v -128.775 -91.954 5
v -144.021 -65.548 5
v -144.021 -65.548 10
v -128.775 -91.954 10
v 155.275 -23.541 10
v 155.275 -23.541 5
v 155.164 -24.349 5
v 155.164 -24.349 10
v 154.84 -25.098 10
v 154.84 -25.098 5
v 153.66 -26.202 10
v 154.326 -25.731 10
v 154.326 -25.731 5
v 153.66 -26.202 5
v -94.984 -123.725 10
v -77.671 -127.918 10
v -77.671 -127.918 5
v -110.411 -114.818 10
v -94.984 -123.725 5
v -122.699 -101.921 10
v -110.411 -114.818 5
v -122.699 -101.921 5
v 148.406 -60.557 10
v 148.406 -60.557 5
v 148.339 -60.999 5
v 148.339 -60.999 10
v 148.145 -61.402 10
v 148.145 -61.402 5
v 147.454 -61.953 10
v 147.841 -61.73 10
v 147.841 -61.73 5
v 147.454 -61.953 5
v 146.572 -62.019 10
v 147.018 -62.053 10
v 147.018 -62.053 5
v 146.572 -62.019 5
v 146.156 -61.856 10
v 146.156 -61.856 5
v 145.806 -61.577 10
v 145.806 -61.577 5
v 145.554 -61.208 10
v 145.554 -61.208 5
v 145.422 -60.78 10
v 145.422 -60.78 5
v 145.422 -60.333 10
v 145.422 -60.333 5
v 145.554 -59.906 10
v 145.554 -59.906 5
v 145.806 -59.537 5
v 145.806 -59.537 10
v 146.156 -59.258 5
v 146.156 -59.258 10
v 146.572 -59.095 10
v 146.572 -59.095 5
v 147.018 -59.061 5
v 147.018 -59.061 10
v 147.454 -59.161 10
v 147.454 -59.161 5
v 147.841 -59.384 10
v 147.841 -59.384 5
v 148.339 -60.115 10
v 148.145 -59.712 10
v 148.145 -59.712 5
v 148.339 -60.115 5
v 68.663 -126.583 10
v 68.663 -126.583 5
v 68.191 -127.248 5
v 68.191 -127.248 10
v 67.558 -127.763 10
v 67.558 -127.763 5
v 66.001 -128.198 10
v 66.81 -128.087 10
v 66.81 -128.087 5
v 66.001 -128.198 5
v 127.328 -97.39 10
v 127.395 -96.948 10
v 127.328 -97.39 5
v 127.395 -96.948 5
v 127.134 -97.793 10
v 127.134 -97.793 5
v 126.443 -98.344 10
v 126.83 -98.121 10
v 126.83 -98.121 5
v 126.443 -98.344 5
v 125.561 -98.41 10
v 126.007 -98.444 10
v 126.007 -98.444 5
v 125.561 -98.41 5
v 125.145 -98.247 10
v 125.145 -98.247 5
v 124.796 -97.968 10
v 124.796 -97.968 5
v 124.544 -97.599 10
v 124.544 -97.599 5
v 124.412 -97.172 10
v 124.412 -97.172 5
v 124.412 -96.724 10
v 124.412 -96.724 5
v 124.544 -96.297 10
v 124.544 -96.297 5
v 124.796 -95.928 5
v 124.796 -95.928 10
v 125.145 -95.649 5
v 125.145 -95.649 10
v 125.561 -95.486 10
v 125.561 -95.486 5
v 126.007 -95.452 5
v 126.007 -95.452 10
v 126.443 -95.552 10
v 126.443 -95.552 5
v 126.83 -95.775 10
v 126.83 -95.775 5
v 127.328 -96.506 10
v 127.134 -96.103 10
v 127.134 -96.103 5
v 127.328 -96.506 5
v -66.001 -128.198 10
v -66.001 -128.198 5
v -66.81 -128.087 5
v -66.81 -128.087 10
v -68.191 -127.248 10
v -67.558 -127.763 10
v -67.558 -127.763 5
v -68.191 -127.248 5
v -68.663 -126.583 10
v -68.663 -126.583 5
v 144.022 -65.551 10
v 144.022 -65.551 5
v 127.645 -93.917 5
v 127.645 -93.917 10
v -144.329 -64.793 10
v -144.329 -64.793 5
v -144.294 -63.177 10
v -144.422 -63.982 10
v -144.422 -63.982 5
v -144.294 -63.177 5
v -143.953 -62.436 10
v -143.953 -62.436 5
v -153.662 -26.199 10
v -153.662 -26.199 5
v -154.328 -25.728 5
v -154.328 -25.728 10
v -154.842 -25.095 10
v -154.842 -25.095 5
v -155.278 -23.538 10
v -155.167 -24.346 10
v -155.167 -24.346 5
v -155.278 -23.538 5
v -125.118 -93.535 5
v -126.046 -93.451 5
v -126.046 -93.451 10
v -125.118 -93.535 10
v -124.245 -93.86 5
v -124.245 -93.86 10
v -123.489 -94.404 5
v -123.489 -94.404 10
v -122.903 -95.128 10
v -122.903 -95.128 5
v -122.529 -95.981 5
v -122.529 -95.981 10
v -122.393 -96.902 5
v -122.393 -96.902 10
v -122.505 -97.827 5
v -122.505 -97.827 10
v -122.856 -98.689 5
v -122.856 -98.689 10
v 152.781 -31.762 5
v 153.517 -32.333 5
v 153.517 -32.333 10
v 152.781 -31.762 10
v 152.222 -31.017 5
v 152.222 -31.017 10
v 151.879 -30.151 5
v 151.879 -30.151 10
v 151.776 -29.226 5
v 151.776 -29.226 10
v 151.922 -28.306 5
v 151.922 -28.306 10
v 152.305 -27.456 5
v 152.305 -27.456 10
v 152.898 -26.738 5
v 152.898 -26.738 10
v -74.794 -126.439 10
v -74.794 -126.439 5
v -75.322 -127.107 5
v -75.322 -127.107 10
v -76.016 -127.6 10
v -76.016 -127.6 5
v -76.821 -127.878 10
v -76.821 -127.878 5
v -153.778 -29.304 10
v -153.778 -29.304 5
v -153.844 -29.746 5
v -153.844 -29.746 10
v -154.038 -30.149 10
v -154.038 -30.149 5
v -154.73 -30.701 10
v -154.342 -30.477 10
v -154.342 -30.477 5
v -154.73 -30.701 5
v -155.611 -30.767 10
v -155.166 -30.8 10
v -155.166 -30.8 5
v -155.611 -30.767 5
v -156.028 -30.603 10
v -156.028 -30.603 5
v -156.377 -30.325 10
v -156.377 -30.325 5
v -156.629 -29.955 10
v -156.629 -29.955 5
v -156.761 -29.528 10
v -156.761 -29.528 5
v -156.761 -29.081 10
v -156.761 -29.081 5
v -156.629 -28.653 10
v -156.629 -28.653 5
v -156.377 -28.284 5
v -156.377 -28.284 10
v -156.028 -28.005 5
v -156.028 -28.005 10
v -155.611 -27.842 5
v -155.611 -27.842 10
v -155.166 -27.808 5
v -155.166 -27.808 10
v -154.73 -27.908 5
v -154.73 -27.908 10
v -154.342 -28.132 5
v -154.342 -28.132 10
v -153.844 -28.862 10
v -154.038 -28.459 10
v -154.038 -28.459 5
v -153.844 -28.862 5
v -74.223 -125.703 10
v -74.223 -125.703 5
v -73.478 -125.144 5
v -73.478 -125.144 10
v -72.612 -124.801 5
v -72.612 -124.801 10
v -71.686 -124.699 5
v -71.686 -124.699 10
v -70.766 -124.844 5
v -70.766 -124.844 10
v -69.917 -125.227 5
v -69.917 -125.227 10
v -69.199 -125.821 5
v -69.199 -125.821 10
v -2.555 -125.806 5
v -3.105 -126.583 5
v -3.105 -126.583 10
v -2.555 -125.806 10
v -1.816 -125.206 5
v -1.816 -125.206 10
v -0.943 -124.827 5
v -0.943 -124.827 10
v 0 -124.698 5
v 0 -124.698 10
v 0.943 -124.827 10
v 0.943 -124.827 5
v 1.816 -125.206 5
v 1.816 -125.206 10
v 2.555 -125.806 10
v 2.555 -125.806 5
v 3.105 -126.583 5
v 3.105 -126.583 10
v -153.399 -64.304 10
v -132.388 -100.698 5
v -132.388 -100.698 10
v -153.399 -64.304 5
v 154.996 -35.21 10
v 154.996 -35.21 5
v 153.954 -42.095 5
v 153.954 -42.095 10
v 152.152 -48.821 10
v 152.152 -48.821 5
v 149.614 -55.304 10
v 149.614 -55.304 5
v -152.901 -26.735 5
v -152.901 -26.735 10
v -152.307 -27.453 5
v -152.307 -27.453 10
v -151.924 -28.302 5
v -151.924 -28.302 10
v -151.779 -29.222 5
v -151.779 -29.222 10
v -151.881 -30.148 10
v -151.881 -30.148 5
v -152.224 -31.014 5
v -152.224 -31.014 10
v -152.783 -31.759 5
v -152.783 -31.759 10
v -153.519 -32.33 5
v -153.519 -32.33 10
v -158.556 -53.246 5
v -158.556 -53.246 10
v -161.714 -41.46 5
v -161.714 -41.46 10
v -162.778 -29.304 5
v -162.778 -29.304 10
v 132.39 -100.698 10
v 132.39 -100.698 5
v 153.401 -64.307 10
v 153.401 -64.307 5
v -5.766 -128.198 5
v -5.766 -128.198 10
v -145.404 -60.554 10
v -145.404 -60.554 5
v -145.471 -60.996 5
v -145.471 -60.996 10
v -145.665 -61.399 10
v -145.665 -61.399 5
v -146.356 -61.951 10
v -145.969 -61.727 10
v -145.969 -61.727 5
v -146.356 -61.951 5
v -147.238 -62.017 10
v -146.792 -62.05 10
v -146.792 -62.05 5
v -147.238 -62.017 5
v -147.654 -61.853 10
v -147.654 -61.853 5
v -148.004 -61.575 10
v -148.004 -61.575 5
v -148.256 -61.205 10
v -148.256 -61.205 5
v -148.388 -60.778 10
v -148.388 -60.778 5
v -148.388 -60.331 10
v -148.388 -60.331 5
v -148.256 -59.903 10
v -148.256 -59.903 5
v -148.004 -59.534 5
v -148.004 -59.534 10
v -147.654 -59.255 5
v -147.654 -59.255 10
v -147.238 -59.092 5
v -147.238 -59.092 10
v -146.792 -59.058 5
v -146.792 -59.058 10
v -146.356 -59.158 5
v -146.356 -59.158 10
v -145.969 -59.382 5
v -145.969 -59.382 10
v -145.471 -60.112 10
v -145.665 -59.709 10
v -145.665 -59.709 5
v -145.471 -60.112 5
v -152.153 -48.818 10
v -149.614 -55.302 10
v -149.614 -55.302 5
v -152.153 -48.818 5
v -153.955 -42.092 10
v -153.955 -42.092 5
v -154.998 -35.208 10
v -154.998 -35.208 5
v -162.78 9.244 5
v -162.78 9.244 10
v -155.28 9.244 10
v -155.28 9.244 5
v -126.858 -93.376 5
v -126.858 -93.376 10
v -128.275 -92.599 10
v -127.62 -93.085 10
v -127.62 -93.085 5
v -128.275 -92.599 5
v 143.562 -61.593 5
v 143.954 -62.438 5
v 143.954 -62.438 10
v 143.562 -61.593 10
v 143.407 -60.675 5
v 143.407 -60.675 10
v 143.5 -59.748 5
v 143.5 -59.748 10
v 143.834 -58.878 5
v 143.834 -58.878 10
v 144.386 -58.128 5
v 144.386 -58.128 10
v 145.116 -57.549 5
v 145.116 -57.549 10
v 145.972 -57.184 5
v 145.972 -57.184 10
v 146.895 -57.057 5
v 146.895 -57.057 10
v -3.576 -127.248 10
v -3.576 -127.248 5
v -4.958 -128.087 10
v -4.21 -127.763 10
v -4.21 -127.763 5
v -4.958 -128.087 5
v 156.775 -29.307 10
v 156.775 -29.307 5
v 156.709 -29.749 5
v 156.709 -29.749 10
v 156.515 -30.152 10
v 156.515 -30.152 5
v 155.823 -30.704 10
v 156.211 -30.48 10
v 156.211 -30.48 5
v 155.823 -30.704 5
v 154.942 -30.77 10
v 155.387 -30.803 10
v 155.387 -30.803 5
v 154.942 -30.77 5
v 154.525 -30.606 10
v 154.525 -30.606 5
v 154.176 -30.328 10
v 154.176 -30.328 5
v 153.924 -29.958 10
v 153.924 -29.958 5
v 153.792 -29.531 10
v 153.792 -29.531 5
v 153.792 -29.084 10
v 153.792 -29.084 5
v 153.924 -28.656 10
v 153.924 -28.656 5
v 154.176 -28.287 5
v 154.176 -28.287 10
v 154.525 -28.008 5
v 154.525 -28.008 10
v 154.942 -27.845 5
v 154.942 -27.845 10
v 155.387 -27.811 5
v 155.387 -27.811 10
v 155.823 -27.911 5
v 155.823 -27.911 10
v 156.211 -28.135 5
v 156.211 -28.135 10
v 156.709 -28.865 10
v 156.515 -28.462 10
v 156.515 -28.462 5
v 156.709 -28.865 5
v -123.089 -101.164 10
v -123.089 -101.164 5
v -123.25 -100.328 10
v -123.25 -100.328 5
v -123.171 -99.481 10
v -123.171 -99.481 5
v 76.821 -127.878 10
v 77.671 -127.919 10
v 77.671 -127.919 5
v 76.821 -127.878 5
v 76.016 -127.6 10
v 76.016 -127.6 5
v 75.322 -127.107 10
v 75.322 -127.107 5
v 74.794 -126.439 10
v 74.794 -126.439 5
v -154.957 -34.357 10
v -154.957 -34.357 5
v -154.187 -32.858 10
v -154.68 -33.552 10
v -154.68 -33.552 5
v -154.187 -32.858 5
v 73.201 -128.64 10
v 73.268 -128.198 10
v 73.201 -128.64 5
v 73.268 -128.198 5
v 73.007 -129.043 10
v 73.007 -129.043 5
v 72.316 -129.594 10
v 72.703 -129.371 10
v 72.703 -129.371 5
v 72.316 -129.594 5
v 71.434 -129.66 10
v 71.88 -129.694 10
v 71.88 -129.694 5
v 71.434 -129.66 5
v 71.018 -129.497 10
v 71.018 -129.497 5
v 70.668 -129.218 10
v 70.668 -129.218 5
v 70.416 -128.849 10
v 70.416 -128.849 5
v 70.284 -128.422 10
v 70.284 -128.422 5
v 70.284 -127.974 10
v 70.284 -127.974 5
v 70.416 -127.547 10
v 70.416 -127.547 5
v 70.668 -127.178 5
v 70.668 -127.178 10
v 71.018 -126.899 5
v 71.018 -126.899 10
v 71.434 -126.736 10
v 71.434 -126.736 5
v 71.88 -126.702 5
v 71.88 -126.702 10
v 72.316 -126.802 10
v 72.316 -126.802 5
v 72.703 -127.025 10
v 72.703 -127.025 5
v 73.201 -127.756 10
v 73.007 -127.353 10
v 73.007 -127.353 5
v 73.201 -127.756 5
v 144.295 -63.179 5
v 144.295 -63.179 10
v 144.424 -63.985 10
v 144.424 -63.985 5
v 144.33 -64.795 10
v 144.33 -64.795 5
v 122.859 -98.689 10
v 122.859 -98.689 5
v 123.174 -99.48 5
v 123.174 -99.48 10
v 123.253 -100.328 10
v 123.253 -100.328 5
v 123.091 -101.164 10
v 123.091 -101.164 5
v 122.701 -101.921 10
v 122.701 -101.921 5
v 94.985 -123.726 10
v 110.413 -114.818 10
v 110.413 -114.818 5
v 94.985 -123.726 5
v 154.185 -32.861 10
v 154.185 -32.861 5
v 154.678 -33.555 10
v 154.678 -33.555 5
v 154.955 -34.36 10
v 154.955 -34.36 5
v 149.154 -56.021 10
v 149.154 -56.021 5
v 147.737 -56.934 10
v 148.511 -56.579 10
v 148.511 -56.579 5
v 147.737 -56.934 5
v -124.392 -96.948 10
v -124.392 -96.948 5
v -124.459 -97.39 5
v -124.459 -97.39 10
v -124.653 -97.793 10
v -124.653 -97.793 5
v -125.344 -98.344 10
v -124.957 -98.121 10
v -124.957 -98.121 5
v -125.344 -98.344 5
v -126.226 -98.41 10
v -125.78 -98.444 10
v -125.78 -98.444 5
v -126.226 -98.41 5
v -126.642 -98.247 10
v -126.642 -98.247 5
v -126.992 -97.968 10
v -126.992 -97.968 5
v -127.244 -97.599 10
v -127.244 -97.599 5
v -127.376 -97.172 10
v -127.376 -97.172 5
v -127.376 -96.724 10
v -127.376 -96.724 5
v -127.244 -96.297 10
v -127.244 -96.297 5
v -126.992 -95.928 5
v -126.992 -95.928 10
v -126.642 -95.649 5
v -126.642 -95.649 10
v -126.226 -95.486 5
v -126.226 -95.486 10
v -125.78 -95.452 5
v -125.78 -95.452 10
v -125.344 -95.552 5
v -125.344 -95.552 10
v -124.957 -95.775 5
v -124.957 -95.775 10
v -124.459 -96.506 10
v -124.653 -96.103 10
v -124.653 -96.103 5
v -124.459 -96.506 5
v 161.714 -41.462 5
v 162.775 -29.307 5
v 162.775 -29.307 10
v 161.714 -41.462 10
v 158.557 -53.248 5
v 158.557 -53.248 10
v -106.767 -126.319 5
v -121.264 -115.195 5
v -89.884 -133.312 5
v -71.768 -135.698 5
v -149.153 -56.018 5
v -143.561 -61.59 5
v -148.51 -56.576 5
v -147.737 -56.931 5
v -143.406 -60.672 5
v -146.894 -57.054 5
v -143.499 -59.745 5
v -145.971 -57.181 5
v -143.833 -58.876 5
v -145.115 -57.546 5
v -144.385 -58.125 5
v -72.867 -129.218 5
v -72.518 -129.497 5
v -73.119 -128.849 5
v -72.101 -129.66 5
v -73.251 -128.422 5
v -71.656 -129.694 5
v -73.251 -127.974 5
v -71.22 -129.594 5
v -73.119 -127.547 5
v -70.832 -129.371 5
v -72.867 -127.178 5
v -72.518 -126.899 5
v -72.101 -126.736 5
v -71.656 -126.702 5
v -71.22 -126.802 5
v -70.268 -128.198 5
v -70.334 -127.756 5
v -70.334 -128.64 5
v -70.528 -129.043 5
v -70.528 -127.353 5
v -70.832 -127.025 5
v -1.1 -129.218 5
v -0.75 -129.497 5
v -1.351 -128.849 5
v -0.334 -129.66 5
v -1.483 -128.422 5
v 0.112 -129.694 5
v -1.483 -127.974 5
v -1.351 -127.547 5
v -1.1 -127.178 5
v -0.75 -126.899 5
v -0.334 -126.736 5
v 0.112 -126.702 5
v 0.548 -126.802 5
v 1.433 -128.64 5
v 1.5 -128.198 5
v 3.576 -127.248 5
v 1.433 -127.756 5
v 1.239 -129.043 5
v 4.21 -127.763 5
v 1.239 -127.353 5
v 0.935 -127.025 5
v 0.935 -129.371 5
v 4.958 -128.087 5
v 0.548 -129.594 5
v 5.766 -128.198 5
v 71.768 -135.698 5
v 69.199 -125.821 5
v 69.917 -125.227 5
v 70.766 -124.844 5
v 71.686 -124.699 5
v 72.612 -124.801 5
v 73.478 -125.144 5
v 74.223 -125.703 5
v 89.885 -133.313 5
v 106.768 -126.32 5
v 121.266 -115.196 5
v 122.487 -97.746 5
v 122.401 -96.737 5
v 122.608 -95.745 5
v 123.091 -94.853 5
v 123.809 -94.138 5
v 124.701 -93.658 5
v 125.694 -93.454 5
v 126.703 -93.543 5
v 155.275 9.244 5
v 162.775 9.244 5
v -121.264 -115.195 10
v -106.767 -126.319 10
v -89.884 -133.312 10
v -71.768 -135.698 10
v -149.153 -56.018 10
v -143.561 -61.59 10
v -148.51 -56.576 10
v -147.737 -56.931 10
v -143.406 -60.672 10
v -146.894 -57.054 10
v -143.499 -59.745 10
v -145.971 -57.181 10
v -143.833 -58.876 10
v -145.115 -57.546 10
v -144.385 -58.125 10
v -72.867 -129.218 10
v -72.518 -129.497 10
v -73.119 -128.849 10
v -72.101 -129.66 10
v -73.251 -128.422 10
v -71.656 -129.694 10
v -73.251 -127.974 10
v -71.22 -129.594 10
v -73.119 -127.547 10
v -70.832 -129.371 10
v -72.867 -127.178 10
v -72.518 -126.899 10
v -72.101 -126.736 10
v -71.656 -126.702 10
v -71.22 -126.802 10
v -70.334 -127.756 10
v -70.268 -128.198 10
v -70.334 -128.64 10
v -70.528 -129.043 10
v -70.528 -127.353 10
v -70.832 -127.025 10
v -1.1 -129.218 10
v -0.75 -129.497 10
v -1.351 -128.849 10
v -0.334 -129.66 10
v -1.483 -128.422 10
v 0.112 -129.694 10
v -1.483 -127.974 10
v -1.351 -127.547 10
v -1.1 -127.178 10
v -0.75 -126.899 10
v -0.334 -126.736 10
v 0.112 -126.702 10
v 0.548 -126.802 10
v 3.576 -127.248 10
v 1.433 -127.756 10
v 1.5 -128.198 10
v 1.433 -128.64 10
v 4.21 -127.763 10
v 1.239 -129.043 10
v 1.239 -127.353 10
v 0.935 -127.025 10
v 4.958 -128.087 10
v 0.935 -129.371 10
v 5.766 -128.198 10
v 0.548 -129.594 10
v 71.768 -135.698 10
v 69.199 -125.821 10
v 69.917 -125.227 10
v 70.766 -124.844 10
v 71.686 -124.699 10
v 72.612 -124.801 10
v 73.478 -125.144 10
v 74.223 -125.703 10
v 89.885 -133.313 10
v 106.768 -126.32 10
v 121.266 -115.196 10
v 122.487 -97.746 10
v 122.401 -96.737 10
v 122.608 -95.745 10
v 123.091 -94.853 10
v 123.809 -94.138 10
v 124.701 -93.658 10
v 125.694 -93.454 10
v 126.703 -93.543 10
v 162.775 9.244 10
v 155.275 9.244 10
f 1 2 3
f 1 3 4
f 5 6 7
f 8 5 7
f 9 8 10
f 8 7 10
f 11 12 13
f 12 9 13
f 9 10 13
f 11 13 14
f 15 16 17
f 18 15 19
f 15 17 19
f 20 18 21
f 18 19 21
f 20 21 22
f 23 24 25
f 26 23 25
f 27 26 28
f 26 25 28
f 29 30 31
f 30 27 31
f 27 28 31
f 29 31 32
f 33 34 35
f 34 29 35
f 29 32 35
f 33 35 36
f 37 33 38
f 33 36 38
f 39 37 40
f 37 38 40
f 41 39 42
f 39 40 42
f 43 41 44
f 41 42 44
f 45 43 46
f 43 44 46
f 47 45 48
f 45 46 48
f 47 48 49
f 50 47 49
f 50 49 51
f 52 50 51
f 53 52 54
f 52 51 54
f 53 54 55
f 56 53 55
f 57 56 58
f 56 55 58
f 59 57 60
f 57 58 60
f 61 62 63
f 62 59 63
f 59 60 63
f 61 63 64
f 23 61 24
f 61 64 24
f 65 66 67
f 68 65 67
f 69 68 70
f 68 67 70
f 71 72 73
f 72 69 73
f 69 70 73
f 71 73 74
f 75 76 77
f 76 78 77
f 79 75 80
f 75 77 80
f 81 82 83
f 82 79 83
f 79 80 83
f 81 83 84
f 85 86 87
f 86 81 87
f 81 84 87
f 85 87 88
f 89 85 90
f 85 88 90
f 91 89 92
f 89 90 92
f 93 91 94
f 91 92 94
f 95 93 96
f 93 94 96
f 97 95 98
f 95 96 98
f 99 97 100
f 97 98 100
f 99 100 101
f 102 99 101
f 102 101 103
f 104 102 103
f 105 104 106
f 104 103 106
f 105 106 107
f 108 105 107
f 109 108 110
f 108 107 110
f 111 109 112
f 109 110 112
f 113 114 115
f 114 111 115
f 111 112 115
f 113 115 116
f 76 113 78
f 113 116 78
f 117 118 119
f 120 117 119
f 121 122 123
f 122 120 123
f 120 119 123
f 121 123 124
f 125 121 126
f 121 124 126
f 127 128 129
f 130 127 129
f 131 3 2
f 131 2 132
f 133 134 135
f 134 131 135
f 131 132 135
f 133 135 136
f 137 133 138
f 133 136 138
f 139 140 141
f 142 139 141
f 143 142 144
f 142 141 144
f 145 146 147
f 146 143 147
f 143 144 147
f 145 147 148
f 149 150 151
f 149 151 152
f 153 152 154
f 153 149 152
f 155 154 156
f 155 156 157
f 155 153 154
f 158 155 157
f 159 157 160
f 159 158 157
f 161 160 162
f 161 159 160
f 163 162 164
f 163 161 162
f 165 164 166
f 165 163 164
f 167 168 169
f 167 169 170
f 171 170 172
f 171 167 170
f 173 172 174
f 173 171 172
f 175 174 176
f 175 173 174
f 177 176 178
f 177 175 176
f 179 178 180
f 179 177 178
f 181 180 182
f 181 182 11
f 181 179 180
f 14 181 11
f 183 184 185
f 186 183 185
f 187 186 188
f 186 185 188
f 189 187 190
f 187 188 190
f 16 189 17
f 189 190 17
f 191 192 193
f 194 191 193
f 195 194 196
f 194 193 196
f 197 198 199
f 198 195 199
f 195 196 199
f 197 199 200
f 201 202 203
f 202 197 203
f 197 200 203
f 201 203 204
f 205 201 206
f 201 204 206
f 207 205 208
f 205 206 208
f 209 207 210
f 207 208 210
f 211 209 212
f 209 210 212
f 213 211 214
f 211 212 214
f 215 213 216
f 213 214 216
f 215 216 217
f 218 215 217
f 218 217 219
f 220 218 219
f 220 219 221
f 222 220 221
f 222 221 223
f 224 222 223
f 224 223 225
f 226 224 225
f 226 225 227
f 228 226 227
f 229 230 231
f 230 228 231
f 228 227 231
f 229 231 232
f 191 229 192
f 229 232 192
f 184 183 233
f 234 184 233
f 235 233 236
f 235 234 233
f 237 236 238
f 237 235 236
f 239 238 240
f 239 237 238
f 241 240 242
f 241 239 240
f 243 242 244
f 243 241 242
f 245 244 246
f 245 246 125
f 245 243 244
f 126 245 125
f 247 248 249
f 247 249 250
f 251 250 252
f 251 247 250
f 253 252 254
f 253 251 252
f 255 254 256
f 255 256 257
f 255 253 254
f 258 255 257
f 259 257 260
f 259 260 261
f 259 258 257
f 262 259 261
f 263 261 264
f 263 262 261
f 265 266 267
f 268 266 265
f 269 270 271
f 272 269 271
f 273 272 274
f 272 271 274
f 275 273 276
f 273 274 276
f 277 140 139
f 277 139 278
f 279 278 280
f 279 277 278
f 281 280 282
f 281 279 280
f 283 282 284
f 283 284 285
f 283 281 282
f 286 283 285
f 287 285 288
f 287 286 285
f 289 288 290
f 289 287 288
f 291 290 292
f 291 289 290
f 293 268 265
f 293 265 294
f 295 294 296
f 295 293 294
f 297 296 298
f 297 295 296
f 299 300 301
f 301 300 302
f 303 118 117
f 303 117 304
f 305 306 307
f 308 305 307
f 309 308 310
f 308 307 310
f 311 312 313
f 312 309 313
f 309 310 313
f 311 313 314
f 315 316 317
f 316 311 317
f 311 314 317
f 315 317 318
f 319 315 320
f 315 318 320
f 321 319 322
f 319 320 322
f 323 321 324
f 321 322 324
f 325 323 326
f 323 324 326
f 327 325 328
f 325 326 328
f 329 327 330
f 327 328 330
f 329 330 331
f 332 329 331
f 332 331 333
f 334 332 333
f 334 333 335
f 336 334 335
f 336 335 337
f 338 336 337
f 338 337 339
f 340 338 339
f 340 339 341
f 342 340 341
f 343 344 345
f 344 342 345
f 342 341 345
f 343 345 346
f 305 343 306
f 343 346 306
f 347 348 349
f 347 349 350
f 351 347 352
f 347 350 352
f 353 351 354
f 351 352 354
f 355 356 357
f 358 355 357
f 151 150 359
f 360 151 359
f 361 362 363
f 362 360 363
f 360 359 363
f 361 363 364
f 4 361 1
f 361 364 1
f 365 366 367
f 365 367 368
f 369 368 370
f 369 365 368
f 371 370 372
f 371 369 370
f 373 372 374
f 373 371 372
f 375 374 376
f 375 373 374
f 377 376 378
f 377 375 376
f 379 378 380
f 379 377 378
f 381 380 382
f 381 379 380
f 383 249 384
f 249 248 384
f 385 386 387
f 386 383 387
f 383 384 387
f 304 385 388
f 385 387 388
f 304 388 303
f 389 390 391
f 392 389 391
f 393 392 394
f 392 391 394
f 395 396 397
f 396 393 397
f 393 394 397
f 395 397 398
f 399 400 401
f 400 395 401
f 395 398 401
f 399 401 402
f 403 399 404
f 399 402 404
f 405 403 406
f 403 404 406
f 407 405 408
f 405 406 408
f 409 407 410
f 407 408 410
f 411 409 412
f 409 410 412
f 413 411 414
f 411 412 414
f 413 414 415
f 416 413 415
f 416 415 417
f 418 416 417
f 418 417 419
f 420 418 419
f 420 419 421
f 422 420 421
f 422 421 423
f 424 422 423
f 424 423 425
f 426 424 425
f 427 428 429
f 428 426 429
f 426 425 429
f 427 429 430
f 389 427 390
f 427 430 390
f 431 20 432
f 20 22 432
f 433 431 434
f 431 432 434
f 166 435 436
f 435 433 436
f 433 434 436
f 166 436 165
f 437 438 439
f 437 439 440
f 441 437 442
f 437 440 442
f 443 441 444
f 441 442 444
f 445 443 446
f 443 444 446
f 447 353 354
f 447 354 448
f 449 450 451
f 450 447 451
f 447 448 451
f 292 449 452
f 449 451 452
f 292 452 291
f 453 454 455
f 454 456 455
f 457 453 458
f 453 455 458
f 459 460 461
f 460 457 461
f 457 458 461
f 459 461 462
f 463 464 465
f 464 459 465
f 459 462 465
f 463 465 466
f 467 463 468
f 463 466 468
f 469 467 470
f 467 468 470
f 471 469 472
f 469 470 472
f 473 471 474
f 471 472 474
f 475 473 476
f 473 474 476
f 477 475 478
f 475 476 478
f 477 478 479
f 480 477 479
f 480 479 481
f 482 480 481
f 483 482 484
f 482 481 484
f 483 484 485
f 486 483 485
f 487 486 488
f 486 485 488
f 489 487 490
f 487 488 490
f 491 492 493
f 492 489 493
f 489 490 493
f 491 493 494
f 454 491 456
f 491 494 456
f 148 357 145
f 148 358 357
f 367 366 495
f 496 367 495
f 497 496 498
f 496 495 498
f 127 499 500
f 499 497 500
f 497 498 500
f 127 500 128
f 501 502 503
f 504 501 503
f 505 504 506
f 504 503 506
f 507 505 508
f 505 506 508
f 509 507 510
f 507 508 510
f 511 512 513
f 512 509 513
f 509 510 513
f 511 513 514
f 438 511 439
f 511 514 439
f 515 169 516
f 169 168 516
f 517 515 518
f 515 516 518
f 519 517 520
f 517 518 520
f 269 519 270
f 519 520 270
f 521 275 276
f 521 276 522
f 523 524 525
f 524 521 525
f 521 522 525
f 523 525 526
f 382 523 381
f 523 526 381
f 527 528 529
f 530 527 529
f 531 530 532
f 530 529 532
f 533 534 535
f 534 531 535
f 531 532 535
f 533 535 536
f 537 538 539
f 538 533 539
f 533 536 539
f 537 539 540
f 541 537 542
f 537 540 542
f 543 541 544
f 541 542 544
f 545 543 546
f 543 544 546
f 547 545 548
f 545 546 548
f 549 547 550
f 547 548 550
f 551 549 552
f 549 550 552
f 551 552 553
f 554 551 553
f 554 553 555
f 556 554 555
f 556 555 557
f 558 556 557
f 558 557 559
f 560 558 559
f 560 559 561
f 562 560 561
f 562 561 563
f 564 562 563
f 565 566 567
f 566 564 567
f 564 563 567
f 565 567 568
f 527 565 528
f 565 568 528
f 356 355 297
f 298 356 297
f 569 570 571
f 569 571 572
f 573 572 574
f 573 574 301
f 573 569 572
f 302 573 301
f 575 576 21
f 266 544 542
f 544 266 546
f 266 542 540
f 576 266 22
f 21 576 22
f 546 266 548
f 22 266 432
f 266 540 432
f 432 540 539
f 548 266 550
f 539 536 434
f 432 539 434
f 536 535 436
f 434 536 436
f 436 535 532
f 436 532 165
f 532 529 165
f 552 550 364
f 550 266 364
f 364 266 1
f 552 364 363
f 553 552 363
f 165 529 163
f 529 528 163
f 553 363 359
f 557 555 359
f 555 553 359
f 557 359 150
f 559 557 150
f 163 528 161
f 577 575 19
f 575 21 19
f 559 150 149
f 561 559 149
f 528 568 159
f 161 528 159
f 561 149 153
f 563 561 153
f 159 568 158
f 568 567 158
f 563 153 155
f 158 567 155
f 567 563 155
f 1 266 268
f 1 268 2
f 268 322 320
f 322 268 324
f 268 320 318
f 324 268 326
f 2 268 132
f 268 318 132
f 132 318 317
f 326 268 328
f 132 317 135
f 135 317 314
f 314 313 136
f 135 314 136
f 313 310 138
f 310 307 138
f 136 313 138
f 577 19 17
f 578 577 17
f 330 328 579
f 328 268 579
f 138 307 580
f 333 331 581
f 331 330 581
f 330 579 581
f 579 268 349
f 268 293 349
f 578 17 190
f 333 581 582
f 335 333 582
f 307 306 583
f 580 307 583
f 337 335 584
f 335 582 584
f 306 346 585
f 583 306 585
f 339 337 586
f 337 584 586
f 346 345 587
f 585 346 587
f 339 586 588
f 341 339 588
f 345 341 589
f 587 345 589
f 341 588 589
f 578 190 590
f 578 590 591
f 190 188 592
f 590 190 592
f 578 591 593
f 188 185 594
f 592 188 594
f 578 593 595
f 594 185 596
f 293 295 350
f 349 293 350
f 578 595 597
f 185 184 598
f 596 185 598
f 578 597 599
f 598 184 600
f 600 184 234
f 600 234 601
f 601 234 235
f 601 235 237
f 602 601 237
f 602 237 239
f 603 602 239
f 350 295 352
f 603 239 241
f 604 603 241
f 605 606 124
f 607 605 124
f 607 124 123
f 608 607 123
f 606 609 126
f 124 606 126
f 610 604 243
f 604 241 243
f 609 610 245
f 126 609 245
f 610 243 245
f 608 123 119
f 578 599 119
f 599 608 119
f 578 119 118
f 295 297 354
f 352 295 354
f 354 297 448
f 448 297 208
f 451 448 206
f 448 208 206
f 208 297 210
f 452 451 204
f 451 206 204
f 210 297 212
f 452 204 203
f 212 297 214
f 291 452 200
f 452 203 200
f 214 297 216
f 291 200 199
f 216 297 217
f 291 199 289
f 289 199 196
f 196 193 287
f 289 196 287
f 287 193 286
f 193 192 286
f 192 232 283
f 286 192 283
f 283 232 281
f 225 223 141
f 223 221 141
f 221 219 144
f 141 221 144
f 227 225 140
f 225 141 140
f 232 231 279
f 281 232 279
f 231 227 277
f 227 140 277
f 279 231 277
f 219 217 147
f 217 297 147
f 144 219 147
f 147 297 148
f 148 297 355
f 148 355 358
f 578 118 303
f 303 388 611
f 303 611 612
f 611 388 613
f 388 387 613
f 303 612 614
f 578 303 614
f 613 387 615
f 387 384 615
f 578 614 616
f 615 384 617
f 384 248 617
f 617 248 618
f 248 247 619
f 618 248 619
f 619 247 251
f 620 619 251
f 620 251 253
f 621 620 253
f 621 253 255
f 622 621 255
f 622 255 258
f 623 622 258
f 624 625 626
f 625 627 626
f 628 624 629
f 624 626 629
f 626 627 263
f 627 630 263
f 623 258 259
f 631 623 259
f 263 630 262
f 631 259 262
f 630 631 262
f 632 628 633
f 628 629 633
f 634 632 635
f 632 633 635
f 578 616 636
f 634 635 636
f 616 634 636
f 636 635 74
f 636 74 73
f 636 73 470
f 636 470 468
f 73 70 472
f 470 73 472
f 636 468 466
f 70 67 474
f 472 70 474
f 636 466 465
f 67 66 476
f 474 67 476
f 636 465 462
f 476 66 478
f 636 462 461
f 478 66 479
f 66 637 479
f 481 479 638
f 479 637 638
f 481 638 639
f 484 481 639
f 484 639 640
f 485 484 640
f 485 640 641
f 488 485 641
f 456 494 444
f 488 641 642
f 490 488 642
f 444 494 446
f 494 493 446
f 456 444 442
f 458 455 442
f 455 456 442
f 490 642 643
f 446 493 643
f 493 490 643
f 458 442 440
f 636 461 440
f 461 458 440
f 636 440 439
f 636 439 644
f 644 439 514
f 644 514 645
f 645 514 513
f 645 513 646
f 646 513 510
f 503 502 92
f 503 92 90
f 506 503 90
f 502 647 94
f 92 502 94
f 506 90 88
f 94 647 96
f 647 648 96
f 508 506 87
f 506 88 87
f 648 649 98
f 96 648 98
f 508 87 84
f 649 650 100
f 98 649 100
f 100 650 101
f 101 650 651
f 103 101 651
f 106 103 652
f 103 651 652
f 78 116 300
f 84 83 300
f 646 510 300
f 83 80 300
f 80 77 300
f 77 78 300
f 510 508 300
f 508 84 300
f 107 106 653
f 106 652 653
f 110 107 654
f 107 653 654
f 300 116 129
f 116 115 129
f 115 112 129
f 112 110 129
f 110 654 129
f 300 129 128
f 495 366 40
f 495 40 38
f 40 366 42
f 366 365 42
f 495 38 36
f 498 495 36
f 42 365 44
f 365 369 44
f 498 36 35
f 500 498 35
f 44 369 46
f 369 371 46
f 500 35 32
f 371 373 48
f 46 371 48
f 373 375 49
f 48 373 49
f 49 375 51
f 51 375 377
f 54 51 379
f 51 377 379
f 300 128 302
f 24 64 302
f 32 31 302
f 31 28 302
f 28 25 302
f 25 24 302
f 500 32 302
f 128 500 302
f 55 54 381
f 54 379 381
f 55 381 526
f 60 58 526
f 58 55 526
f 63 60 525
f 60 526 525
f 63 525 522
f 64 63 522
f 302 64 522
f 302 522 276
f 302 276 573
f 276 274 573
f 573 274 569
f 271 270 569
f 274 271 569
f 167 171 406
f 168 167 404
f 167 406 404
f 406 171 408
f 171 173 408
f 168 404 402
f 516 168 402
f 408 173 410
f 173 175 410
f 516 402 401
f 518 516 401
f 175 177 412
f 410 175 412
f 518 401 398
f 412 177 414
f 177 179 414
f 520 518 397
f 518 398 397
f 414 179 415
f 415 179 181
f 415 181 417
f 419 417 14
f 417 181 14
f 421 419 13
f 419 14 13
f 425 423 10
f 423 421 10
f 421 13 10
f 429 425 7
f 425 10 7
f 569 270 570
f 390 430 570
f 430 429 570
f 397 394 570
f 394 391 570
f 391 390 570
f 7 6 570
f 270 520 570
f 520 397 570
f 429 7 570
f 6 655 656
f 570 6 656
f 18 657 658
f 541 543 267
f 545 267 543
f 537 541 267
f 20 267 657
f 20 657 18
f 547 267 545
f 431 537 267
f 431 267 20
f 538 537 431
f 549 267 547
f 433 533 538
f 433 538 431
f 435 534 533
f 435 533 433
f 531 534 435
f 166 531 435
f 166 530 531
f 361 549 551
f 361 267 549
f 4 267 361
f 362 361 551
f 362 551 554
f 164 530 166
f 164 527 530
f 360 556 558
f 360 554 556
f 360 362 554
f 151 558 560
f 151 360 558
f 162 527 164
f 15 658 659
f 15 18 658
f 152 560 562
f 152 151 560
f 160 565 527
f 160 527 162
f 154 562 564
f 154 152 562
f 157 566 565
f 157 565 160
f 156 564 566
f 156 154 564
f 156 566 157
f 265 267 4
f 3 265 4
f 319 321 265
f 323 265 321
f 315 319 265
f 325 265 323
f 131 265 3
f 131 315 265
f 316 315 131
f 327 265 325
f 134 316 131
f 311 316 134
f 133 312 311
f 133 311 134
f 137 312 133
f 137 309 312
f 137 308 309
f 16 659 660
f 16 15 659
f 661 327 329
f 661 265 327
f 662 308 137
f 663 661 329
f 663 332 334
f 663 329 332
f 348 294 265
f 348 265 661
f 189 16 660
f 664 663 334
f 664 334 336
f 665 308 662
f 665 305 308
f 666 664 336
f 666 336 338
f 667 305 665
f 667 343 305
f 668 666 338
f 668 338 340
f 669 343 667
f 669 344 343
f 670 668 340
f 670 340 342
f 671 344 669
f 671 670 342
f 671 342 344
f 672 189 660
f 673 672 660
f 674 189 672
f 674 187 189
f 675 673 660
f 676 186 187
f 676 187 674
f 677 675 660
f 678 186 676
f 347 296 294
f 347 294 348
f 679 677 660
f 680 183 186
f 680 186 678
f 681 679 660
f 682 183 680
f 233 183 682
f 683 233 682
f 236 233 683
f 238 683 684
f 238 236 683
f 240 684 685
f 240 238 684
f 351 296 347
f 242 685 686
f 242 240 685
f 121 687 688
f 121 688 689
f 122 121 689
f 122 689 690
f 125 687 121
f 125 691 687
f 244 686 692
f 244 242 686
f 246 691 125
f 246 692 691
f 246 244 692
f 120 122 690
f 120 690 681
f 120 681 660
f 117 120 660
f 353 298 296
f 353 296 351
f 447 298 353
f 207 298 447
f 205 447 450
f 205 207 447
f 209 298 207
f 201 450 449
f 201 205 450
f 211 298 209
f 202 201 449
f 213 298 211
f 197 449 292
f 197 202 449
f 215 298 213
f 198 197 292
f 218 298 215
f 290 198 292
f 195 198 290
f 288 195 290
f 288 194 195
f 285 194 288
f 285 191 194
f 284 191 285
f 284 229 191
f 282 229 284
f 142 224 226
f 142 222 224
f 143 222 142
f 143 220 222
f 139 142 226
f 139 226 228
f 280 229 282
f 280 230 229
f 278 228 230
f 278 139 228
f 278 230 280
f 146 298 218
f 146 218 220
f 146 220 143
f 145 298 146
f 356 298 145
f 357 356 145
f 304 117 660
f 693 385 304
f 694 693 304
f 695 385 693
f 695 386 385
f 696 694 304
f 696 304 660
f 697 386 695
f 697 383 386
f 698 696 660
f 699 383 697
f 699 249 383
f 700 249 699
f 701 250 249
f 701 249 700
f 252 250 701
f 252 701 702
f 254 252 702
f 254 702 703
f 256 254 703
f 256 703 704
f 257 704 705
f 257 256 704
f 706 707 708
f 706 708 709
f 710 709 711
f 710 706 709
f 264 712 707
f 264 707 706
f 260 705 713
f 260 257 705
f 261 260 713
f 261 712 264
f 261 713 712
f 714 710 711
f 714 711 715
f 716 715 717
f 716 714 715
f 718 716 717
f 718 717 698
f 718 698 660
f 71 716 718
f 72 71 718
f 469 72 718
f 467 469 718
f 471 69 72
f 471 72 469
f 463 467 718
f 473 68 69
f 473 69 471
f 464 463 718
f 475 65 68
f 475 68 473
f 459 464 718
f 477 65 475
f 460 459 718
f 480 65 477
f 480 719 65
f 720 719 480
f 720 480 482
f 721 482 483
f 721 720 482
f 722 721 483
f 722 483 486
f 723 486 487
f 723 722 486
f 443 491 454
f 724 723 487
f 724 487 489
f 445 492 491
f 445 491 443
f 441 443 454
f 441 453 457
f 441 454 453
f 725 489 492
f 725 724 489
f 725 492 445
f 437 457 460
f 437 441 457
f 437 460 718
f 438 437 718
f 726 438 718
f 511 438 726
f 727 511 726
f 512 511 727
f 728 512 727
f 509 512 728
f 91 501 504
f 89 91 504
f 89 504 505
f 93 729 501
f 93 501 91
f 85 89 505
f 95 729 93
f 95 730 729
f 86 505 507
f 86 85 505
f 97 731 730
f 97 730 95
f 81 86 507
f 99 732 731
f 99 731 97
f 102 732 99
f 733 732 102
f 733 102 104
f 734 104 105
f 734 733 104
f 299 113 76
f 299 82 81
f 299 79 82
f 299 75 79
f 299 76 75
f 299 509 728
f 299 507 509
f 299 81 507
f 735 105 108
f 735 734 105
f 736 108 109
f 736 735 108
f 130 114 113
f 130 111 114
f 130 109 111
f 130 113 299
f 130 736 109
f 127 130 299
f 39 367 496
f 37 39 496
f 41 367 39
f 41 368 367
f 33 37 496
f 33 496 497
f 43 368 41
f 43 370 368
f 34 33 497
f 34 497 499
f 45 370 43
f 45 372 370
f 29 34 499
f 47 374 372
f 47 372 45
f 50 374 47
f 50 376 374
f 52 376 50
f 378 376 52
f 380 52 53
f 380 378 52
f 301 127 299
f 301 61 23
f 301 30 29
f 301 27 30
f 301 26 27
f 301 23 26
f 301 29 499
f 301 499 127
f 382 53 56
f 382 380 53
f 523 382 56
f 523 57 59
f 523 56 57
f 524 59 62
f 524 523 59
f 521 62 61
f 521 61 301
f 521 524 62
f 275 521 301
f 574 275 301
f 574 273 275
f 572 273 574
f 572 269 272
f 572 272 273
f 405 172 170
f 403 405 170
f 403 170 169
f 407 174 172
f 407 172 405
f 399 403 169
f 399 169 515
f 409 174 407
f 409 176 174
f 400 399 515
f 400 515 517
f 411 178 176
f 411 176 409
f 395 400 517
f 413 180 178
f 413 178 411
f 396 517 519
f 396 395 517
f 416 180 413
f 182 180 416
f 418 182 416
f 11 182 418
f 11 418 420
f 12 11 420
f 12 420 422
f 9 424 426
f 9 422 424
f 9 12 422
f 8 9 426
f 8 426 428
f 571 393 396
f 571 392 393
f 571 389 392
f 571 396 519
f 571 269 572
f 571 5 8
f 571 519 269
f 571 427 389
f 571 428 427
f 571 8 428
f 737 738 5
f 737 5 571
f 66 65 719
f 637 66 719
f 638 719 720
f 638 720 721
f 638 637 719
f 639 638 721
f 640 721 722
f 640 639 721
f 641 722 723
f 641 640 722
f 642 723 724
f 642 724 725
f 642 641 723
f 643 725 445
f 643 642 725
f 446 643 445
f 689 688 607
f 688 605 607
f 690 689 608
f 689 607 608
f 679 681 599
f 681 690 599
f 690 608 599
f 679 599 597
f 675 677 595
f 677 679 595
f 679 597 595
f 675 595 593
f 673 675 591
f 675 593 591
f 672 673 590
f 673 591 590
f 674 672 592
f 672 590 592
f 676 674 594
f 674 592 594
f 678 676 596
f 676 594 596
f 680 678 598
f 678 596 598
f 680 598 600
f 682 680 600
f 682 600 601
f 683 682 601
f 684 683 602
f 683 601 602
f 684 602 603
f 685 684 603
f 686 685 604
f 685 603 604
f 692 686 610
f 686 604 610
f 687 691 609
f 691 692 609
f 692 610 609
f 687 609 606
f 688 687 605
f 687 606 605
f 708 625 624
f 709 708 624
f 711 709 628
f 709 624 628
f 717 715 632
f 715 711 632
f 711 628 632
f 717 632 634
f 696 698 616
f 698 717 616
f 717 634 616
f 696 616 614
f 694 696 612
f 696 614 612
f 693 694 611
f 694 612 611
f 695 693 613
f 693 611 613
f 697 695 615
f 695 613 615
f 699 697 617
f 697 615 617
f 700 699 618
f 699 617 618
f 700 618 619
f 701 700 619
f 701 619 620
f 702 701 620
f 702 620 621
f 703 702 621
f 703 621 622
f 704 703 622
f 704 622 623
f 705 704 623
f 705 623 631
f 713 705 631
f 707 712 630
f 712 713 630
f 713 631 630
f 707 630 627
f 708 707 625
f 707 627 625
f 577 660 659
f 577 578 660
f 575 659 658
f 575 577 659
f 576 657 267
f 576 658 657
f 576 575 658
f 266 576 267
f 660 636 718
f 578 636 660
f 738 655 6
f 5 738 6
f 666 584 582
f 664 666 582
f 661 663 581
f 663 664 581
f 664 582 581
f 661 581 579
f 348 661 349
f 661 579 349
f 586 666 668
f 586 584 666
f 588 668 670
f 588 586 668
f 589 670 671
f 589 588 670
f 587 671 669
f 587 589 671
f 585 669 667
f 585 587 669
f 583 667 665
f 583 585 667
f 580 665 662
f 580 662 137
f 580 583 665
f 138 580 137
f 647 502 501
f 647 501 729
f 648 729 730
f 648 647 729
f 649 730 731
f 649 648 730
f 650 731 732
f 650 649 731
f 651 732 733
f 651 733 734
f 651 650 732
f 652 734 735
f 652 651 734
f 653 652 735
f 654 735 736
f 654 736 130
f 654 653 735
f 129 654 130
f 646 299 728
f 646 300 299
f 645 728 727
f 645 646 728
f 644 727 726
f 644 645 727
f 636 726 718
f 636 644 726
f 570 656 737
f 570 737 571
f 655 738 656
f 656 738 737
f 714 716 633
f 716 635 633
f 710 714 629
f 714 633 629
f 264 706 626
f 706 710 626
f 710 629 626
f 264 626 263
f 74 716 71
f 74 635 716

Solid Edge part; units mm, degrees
sketch "Sketch1" plane through (0.0007, 14.651, 5) normal (0, 0, 1) x (1, 0, 0)
  line L0 (-114.0407, 98.8093) -> (-57.2599, 131.5929)
  arc A0 (-54.1474, 131.5247) -> (-57.2599, 131.5929) centre (-55.7598, 128.9948) ccw
  arc A1 (-47.0142, 137.1861) -> (-48.7662, 134.4664) centre (-45.7662, 134.458) ccw
  arc A2 (-47.0142, 137.1861) -> (-26.9146, 142.5706) centre (-21.0226, 80.3698) cw
  arc A3 (-24.0376, 141.0909) -> (-26.9146, 142.5706) centre (-26.6317, 139.5839) ccw
  arc A4 (-15.245, 142.849) -> (-17.9063, 141.2336) centre (-15.245, 139.849) ccw
  line L1 (-15.245, 142.849) -> (15.2436, 142.849)
  arc A5 (17.905, 141.2336) -> (15.2436, 142.849) centre (15.2436, 139.849) ccw
  arc A6 (26.9132, 142.5696) -> (24.036, 141.0904) centre (26.6298, 139.583) ccw
  arc A7 (26.9132, 142.5696) -> (47.0027, 137.1869) centre (21.0099, 80.3561) cw
  arc A8 (48.7549, 134.4673) -> (47.0027, 137.1869) centre (45.7549, 134.4587) ccw
  arc A9 (57.2487, 131.5943) -> (54.1362, 131.526) centre (55.7487, 128.9962) ccw
  line L2 (57.2487, 131.5943) -> (114.0299, 98.8129)
  arc A10 (115.5271, 96.0833) -> (114.0299, 98.8129) centre (112.5299, 96.2148) ccw
  arc A11 (124.0003, 92.7805) -> (120.7849, 92.9052) centre (122.2944, 90.3127) ccw
  arc A12 (124.0003, 92.7805) -> (155.0355, 39.027) centre (82.7747, 33.1424) cw
  arc A13 (153.5358, 36.1799) -> (155.0355, 39.027) centre (152.0454, 38.7835) ccw
  arc A14 (155.2747, 27.3761) -> (153.6593, 30.0375) centre (152.2747, 27.3761) ccw
  line L3 (155.2747, 27.3761) -> (155.2747, -38.192)
  arc A15 (153.6593, -40.8534) -> (155.2747, -38.192) centre (152.2747, -38.192) ccw
  arc A16 (154.9954, -49.8615) -> (153.5161, -46.9844) centre (152.0088, -49.5782) ccw
  arc A17 (154.9954, -49.8615) -> (149.6134, -69.9554) centre (92.7533, -43.9583) cw
  arc A18 (146.8942, -71.7079) -> (149.6134, -69.9554) centre (146.8851, -68.7079) ccw
  arc A19 (144.0217, -80.2016) -> (143.9534, -77.0892) centre (141.4236, -78.7016) ccw
  line L4 (144.0217, -80.2016) -> (127.6444, -108.5679)
  arc A20 (122.7007, -116.5716) -> (122.8583, -113.3403) centre (120.256, -114.8329) ccw
  arc A21 (77.6703, -142.5696) -> (122.7007, -116.5716) centre (71.767, -80.3476) ccw
  arc A22 (74.7931, -141.0904) -> (77.6703, -142.5696) centre (77.3869, -139.583) ccw
  arc A23 (66.0007, -142.849) -> (68.6621, -141.2336) centre (66.0007, -139.849) ccw
  line L5 (5.7656, -142.849) -> (66.0007, -142.849)
  arc A24 (3.1042, -141.2336) -> (5.7656, -142.849) centre (5.7656, -139.849) ccw
  arc A25 (-5.767, -142.849) -> (-3.1056, -141.2336) centre (-5.767, -139.849) ccw
  line L6 (-66.0021, -142.849) -> (-5.767, -142.849)
  arc A26 (-68.6634, -141.2336) -> (-66.0021, -142.849) centre (-66.0021, -139.849) ccw
  arc A27 (-77.6716, -142.5694) -> (-74.7944, -141.0903) centre (-77.3881, -139.5828) ccw
  arc A28 (-122.6994, -116.5717) -> (-77.6716, -142.5694) centre (-71.7665, -80.349) ccw
  arc A29 (-122.857, -113.3404) -> (-122.6994, -116.5717) centre (-120.2547, -114.833) ccw
  arc A30 (-128.7762, -106.6053) -> (-126.0465, -108.1024) centre (-126.1781, -105.1053) ccw
  line L7 (-144.0218, -80.199) -> (-128.7762, -106.6053)
  arc A31 (-143.9535, -77.0865) -> (-144.0218, -80.199) centre (-141.4237, -78.699) ccw
  arc A32 (-149.6144, -69.9531) -> (-146.8949, -71.7053) centre (-146.8862, -68.7053) ccw
  arc A33 (-154.9987, -49.8585) -> (-149.6144, -69.9531) centre (-92.7672, -43.9523) ccw
  arc A34 (-153.5196, -46.9813) -> (-154.9987, -49.8585) centre (-152.0122, -49.5751) ccw
  arc A35 (-155.2786, -38.189) -> (-153.6631, -40.8503) centre (-152.2786, -38.1889) ccw
  line L8 (-155.2818, 27.3758) -> (-155.2786, -38.189)
  arc A36 (-153.6665, 30.0373) -> (-155.2818, 27.3758) centre (-152.2818, 27.376) ccw
  arc A37 (-155.0428, 39.0267) -> (-153.5432, 36.1796) centre (-152.0527, 38.7832) ccw
  arc A38 (-124.0109, 92.7765) -> (-155.0428, 39.0267) centre (-82.7847, 33.1421) ccw
  arc A39 (-120.7955, 92.9014) -> (-124.0109, 92.7765) centre (-122.3049, 90.3088) ccw
  arc A40 (-114.0407, 98.8093) -> (-115.5378, 96.0796) centre (-112.5406, 96.2112) ccw
  arc A41 (-48.7662, 134.4664) -> (-54.1474, 131.5247) centre (-52.2662, 134.4761) cw
  arc A42 (-17.9064, 141.2336) -> (-24.0377, 141.0909) centre (-21.0113, 142.849) cw
  arc A43 (24.036, 141.0904) -> (17.905, 141.2336) centre (21.0099, 142.849) cw
  arc A44 (54.1362, 131.526) -> (48.7549, 134.4673) centre (52.2549, 134.4774) cw
  arc A45 (120.7849, 92.9052) -> (115.5271, 96.0832) centre (119.0237, 95.9298) cw
  arc A46 (153.6593, 30.0375) -> (153.5358, 36.1799) centre (155.2747, 33.1424) cw
  arc A47 (153.5161, -46.9844) -> (153.6593, -40.8534) centre (155.2747, -43.9583) cw
  arc A48 (143.9534, -77.0891) -> (146.8942, -71.7079) centre (146.9048, -75.2079) cw
  arc A49 (122.8584, -113.3404) -> (127.6444, -108.5679) centre (125.8944, -111.599) cw
  arc A50 (68.6621, -141.2336) -> (74.7931, -141.0904) centre (71.767, -142.849) cw
  arc A51 (-3.1056, -141.2336) -> (3.1042, -141.2336) centre (-0.0007, -142.849) cw
  arc A52 (-74.7944, -141.0903) -> (-68.6635, -141.2336) centre (-71.7684, -142.849) cw
  arc A53 (-126.0466, -108.1024) -> (-122.857, -113.3404) centre (-125.8931, -111.599) cw
  arc A54 (-146.8949, -71.7053) -> (-143.9536, -77.0866) centre (-146.905, -75.2053) cw
  arc A55 (-153.6632, -40.8503) -> (-153.5196, -46.9813) centre (-155.2784, -43.9553) cw
  arc A56 (-153.5432, 36.1796) -> (-153.6665, 30.0373) centre (-155.2821, 33.1421) cw
  arc A57 (-115.5377, 96.0796) -> (-120.7955, 92.9014) centre (-119.0344, 95.926) cw
  line L9 (-56.0166, 140.971) -> (-122.7845, 102.4212)
  arc A58 (-162.7821, 33.1421) -> (-122.7845, 102.4212) centre (-82.7847, 33.1421) cw
  line L10 (-162.7821, 33.1421) -> (-162.7784, -43.9553)
  arc A59 (-162.7784, -43.9553) -> (-153.4002, -78.9553) centre (-92.7784, -43.9553) ccw
  line L11 (-132.3882, -115.349) -> (-153.4002, -78.9553)
  arc A60 (-132.3882, -115.349) -> (-71.7683, -150.349) centre (-71.7665, -80.349) ccw
  line L12 (71.767, -150.349) -> (-71.7683, -150.349)
  arc A61 (71.767, -150.349) -> (132.3896, -115.349) centre (71.7678, -80.349) ccw
  line L13 (132.3896, -115.349) -> (153.4002, -78.9576)
  arc A62 (162.7747, -43.9583) -> (153.4002, -78.9576) centre (92.791, -43.9684) cw
  line L14 (162.7747, 33.1424) -> (162.7747, -43.9583)
  arc A63 (122.7736, 102.4251) -> (162.7747, 33.1424) centre (82.7747, 33.1424) cw
  line L15 (56.0045, 140.9728) -> (122.7736, 102.4251)
  arc A64 (21.0099, 150.349) -> (56.0045, 140.9728) centre (21.008, 80.349) cw
  line L16 (-21.0112, 150.349) -> (21.0099, 150.349)
  arc A65 (-32.5074, 149.4015) -> (-21.0112, 150.349) centre (-20.997, 79.961) cw
  arc A66 (-44.641, 146.2432) -> (-32.5074, 149.4015) centre (-21.0122, 80.3518) cw
  arc A67 (-56.0166, 140.971) -> (-44.641, 146.2432) centre (-21.0122, 80.3518) cw
  circle A68 centre (-71.7683, -142.849) radius 1.5
  circle A69 centre (-0.0007, -142.849) radius 1.5
  circle A70 centre (-125.893, -111.599) radius 1.5
  circle A71 centre (-146.905, -75.2053) radius 1.5
  circle A72 centre (-155.2784, -43.9553) radius 1.5
  circle A73 centre (-155.2821, 33.1421) radius 1.5
  circle A74 centre (-119.0344, 95.9261) radius 1.5
  circle A75 centre (-52.2662, 134.4761) radius 1.5
  circle A76 centre (-21.0112, 142.849) radius 1.5
  circle A77 centre (21.0099, 142.849) radius 1.5
  circle A78 centre (52.2549, 134.4774) radius 1.5
  circle A79 centre (119.0237, 95.9298) radius 1.5
  circle A80 centre (155.2747, 33.1424) radius 1.5
  circle A81 centre (155.2747, -43.9583) radius 1.5
  circle A82 centre (146.9048, -75.2079) radius 1.5
  circle A83 centre (125.8944, -111.599) radius 1.5
  circle A84 centre (71.767, -142.849) radius 1.5
extrude "ExtrudedProtrusion_7" add sketch "Sketch1" along normal blind 5
sketch "Sketch2" plane through (-0.003, 14.651, 10) normal (0, 0, 1) x (1, 0, 0)
  line L0 (-168.1883, -5.4066) -> (170.0115, -5.4066)
  line L1 (170.0115, -5.4066) -> (170.0115, 153.6029)
  line L2 (170.0115, 153.6029) -> (-168.1883, 153.6029)
  line L3 (-168.1883, 153.6029) -> (-168.1883, -5.4066)
extrude "Cutout1" cut sketch "Sketch2" against normal up to next
properties material "Polycarbonate"
